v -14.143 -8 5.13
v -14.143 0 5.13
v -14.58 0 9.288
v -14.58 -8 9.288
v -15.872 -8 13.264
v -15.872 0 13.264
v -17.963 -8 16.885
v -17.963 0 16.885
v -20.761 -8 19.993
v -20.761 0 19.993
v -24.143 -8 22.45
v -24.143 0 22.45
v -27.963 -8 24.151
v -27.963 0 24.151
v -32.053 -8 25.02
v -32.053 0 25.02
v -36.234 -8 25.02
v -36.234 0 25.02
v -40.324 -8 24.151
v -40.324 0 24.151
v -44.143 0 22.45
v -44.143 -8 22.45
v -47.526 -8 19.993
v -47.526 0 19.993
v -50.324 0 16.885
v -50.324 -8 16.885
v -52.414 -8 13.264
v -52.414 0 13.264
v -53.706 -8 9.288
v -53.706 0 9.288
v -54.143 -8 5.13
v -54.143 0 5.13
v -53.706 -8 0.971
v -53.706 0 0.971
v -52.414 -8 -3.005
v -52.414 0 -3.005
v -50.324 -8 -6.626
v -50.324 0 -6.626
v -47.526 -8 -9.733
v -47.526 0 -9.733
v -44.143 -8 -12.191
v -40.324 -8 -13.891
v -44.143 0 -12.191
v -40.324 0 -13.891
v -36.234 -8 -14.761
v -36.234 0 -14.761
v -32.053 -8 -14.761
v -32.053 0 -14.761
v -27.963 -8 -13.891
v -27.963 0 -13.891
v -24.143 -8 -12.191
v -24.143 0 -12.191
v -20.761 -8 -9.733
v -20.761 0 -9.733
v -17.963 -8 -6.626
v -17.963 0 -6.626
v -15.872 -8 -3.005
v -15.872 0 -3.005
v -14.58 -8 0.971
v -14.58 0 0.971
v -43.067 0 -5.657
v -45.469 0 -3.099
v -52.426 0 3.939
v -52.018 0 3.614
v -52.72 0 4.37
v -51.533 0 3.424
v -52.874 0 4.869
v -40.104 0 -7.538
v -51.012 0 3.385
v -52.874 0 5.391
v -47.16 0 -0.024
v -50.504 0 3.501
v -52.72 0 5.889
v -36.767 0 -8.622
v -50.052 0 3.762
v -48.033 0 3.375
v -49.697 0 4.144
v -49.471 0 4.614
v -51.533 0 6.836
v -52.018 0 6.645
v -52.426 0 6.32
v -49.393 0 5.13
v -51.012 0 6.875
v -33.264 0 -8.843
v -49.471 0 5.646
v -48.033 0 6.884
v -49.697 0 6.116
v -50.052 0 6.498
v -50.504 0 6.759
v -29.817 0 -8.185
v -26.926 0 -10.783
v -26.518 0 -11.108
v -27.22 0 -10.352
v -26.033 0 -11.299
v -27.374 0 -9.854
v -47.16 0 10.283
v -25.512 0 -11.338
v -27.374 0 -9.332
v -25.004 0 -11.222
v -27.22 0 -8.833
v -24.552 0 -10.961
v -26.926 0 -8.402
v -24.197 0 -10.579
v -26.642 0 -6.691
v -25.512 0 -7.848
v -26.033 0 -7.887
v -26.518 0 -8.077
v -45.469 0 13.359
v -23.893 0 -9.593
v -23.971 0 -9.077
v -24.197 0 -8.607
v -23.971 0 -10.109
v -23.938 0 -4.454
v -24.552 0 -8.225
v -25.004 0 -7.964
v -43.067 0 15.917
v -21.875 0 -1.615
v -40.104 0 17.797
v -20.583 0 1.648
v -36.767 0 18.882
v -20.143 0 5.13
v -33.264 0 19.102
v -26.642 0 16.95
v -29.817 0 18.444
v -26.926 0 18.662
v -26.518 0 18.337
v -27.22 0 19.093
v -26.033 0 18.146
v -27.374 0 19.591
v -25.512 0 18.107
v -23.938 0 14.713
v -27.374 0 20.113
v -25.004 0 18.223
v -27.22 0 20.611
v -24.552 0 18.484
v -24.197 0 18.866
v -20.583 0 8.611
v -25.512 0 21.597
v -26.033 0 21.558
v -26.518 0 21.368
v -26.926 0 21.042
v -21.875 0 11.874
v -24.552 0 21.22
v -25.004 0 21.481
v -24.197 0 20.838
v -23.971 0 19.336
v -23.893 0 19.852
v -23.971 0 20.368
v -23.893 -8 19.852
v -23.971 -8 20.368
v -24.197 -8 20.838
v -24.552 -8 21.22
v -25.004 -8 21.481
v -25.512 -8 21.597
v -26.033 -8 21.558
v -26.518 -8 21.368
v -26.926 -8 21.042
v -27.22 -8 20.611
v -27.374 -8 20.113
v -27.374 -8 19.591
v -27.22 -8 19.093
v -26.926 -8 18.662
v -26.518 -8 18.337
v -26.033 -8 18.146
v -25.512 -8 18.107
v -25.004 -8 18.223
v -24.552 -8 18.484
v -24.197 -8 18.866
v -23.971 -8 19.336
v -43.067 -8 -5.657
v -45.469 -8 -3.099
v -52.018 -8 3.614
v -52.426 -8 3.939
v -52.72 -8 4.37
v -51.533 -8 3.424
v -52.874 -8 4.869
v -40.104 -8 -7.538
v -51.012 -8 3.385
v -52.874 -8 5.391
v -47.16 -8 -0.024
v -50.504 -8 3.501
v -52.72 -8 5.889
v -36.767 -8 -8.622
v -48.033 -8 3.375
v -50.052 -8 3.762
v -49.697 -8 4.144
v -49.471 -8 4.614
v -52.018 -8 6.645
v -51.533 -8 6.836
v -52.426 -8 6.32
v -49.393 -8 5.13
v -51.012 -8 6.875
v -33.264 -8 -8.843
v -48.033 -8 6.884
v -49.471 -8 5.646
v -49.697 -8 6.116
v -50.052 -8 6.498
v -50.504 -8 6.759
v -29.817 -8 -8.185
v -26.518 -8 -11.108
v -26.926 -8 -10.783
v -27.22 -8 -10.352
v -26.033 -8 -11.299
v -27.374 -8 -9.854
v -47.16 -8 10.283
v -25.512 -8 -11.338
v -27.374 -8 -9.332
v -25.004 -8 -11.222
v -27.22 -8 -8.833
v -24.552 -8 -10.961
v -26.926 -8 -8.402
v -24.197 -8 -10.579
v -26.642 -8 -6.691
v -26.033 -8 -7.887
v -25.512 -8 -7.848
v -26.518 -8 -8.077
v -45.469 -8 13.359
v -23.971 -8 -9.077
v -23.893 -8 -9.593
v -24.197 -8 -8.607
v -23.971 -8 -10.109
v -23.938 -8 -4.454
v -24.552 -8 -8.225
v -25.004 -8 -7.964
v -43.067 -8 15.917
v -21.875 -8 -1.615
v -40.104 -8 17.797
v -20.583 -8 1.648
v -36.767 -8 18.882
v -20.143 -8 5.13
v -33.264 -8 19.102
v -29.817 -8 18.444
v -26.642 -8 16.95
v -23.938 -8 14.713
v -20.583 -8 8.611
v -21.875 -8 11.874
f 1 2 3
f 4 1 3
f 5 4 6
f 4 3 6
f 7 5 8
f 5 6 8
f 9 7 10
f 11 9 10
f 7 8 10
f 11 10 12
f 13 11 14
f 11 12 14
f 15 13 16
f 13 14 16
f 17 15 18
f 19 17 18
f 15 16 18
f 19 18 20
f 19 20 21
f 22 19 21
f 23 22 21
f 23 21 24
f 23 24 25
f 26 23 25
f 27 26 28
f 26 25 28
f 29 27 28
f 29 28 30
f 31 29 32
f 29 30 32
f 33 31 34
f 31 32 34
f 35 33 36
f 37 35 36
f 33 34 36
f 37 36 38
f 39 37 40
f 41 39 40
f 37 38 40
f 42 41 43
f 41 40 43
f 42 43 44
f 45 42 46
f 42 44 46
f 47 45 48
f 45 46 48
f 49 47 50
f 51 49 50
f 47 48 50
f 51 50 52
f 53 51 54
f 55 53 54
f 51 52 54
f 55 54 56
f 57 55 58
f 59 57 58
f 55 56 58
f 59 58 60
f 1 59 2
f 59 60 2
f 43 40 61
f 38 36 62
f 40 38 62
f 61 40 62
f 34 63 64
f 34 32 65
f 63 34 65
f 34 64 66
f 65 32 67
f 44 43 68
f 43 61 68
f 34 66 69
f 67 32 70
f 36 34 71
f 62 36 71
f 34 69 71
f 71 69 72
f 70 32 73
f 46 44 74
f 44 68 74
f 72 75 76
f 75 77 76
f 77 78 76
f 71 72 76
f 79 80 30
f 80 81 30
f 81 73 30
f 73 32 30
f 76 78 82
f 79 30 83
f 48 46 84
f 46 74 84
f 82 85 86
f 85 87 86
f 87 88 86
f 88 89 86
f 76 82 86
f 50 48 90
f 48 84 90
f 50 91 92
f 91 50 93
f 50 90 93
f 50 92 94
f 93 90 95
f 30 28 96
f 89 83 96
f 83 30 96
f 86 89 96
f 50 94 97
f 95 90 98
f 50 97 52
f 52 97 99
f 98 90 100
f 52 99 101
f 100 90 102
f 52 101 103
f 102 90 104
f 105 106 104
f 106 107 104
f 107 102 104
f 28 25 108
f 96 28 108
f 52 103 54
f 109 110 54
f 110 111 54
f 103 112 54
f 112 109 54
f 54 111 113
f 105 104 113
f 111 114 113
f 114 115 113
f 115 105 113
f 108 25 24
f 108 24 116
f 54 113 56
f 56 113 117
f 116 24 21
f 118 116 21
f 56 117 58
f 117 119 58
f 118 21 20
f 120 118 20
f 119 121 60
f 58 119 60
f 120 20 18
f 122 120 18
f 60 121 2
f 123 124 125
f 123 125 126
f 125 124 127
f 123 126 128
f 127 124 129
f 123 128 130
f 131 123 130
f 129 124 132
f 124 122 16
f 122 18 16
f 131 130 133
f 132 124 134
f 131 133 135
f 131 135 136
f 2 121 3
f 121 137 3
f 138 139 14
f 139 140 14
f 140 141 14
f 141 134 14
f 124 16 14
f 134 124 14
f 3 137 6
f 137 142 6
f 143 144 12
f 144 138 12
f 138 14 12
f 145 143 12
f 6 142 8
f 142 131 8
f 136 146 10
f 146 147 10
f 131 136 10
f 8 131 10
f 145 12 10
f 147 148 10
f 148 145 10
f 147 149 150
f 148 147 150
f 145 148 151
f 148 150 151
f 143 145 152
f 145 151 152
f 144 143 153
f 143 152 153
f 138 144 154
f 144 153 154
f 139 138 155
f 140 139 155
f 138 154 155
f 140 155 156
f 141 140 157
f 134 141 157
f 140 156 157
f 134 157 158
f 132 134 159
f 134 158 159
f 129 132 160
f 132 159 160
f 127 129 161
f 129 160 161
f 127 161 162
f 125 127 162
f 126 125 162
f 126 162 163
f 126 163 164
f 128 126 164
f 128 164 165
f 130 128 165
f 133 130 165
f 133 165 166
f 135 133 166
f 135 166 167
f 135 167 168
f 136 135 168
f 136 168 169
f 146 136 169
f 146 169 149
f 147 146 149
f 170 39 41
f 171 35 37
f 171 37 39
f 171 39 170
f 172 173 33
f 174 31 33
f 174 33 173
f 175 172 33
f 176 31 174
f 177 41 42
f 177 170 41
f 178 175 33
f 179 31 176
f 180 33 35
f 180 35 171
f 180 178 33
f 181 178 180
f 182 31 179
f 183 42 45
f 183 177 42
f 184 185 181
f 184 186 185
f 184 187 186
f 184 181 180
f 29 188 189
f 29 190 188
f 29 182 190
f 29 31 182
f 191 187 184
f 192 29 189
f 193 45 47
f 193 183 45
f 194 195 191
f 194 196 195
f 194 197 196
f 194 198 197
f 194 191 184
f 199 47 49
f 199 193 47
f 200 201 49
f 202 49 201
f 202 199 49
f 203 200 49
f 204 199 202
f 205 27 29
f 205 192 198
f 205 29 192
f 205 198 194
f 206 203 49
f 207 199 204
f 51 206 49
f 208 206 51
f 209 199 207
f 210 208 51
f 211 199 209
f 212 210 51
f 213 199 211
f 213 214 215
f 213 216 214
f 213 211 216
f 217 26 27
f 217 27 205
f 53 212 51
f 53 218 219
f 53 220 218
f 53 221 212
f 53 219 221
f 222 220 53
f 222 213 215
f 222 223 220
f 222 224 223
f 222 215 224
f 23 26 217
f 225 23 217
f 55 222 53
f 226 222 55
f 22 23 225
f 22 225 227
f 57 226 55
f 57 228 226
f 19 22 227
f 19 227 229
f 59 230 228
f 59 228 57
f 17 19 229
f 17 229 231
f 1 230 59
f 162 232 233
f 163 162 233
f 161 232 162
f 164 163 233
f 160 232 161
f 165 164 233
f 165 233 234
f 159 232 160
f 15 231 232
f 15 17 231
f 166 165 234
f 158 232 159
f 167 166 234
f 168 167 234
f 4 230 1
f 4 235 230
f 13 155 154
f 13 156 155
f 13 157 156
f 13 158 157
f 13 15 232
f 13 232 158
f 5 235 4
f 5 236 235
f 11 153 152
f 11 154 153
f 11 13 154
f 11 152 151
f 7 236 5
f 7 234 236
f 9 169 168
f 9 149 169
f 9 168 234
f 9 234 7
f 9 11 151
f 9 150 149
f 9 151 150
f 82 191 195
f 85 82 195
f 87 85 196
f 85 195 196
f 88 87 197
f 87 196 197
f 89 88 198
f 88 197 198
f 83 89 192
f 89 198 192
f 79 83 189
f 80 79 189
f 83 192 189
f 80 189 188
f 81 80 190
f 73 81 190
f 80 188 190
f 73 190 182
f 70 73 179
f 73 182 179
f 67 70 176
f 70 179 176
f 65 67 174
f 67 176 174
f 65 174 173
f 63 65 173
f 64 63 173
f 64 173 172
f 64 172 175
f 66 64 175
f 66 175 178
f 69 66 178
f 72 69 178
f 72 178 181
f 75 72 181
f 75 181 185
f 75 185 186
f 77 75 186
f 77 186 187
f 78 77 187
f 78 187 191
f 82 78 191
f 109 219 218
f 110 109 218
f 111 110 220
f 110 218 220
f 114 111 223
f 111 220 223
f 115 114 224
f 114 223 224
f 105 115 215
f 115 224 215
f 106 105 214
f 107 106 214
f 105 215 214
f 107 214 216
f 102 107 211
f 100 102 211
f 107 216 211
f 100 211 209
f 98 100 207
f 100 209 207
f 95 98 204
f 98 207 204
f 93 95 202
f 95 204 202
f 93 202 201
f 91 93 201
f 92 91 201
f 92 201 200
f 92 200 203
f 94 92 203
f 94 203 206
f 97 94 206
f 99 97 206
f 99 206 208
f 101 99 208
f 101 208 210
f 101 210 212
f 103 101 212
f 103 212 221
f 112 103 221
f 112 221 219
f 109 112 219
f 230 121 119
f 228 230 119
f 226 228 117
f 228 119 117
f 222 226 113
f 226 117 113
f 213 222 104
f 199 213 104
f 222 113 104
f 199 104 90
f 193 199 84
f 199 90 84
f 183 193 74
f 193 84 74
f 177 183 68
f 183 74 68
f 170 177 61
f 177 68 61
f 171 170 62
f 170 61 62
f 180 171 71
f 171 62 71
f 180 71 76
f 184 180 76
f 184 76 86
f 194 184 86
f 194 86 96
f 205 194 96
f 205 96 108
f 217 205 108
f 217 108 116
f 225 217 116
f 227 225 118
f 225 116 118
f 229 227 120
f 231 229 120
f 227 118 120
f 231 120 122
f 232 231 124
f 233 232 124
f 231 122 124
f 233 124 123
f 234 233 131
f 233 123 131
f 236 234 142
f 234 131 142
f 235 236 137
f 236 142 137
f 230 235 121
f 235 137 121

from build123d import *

# Parameters (mm, degrees)
SKETCH1_R           = 20
BOSS_EXTRUDE1_DEPTH = 8
SKETCH2_R           = 14
CUT_EXTRUDE1_DEPTH  = 8
CUT_EXTRUDE2_REACH  = 10
SKETCH3_R           = 1.75


with BuildPart() as part:
    # Sketch1 → Boss-Extrude1 (new body)
    with BuildSketch(Plane.XZ):
        with Locations((-34.143225555, 5.12970783)):
            Circle(SKETCH1_R)
    extrude(amount=BOSS_EXTRUDE1_DEPTH)

    # Sketch2 → Cut-Extrude1 (cut)
    with BuildSketch(Plane(origin=(0, 0, 0), x_dir=(1, 0, 0), z_dir=(0, 1, 0))):
        with Locations((-34.143225555, -5.12970783)):
            Circle(SKETCH2_R)
    extrude(amount=-CUT_EXTRUDE1_DEPTH, mode=Mode.SUBTRACT)

    # Sketch3 → Cut-Extrude2 (cut, up to next)
    with BuildSketch(Plane.XZ.offset(8), mode=Mode.PRIVATE) as cut_extrude2_sk1:
        with Locations((-25.643225555, 19.852139695)):
            Circle(SKETCH3_R)
    cut_extrude2_tool1 = extrude(cut_extrude2_sk1.sketch, amount=-CUT_EXTRUDE2_REACH, mode=Mode.PRIVATE) & part.part
    add(cut_extrude2_tool1.solids().sort_by_distance((-25.643226, -8, 19.85214))[0], mode=Mode.SUBTRACT)
    # Sketch3 → Cut-Extrude2 (cut, up to next)
    with BuildSketch(Plane.XZ.offset(8), mode=Mode.PRIVATE) as cut_extrude2_sk2:
        with Locations((-25.643225555, -9.592724034)):
            Circle(SKETCH3_R)
    cut_extrude2_tool2 = extrude(cut_extrude2_sk2.sketch, amount=-CUT_EXTRUDE2_REACH, mode=Mode.PRIVATE) & part.part
    add(cut_extrude2_tool2.solids().sort_by_distance((-25.643226, -8, -9.592724))[0], mode=Mode.SUBTRACT)
    # Sketch3 → Cut-Extrude2 (cut, up to next)
    with BuildSketch(Plane.XZ.offset(8), mode=Mode.PRIVATE) as cut_extrude2_sk3:
        with Locations((-51.143225555, 5.12970783)):
            Circle(SKETCH3_R)
    cut_extrude2_tool3 = extrude(cut_extrude2_sk3.sketch, amount=-CUT_EXTRUDE2_REACH, mode=Mode.PRIVATE) & part.part
    add(cut_extrude2_tool3.solids().sort_by_distance((-51.143226, -8, 5.129708))[0], mode=Mode.SUBTRACT)


solid = part.part
